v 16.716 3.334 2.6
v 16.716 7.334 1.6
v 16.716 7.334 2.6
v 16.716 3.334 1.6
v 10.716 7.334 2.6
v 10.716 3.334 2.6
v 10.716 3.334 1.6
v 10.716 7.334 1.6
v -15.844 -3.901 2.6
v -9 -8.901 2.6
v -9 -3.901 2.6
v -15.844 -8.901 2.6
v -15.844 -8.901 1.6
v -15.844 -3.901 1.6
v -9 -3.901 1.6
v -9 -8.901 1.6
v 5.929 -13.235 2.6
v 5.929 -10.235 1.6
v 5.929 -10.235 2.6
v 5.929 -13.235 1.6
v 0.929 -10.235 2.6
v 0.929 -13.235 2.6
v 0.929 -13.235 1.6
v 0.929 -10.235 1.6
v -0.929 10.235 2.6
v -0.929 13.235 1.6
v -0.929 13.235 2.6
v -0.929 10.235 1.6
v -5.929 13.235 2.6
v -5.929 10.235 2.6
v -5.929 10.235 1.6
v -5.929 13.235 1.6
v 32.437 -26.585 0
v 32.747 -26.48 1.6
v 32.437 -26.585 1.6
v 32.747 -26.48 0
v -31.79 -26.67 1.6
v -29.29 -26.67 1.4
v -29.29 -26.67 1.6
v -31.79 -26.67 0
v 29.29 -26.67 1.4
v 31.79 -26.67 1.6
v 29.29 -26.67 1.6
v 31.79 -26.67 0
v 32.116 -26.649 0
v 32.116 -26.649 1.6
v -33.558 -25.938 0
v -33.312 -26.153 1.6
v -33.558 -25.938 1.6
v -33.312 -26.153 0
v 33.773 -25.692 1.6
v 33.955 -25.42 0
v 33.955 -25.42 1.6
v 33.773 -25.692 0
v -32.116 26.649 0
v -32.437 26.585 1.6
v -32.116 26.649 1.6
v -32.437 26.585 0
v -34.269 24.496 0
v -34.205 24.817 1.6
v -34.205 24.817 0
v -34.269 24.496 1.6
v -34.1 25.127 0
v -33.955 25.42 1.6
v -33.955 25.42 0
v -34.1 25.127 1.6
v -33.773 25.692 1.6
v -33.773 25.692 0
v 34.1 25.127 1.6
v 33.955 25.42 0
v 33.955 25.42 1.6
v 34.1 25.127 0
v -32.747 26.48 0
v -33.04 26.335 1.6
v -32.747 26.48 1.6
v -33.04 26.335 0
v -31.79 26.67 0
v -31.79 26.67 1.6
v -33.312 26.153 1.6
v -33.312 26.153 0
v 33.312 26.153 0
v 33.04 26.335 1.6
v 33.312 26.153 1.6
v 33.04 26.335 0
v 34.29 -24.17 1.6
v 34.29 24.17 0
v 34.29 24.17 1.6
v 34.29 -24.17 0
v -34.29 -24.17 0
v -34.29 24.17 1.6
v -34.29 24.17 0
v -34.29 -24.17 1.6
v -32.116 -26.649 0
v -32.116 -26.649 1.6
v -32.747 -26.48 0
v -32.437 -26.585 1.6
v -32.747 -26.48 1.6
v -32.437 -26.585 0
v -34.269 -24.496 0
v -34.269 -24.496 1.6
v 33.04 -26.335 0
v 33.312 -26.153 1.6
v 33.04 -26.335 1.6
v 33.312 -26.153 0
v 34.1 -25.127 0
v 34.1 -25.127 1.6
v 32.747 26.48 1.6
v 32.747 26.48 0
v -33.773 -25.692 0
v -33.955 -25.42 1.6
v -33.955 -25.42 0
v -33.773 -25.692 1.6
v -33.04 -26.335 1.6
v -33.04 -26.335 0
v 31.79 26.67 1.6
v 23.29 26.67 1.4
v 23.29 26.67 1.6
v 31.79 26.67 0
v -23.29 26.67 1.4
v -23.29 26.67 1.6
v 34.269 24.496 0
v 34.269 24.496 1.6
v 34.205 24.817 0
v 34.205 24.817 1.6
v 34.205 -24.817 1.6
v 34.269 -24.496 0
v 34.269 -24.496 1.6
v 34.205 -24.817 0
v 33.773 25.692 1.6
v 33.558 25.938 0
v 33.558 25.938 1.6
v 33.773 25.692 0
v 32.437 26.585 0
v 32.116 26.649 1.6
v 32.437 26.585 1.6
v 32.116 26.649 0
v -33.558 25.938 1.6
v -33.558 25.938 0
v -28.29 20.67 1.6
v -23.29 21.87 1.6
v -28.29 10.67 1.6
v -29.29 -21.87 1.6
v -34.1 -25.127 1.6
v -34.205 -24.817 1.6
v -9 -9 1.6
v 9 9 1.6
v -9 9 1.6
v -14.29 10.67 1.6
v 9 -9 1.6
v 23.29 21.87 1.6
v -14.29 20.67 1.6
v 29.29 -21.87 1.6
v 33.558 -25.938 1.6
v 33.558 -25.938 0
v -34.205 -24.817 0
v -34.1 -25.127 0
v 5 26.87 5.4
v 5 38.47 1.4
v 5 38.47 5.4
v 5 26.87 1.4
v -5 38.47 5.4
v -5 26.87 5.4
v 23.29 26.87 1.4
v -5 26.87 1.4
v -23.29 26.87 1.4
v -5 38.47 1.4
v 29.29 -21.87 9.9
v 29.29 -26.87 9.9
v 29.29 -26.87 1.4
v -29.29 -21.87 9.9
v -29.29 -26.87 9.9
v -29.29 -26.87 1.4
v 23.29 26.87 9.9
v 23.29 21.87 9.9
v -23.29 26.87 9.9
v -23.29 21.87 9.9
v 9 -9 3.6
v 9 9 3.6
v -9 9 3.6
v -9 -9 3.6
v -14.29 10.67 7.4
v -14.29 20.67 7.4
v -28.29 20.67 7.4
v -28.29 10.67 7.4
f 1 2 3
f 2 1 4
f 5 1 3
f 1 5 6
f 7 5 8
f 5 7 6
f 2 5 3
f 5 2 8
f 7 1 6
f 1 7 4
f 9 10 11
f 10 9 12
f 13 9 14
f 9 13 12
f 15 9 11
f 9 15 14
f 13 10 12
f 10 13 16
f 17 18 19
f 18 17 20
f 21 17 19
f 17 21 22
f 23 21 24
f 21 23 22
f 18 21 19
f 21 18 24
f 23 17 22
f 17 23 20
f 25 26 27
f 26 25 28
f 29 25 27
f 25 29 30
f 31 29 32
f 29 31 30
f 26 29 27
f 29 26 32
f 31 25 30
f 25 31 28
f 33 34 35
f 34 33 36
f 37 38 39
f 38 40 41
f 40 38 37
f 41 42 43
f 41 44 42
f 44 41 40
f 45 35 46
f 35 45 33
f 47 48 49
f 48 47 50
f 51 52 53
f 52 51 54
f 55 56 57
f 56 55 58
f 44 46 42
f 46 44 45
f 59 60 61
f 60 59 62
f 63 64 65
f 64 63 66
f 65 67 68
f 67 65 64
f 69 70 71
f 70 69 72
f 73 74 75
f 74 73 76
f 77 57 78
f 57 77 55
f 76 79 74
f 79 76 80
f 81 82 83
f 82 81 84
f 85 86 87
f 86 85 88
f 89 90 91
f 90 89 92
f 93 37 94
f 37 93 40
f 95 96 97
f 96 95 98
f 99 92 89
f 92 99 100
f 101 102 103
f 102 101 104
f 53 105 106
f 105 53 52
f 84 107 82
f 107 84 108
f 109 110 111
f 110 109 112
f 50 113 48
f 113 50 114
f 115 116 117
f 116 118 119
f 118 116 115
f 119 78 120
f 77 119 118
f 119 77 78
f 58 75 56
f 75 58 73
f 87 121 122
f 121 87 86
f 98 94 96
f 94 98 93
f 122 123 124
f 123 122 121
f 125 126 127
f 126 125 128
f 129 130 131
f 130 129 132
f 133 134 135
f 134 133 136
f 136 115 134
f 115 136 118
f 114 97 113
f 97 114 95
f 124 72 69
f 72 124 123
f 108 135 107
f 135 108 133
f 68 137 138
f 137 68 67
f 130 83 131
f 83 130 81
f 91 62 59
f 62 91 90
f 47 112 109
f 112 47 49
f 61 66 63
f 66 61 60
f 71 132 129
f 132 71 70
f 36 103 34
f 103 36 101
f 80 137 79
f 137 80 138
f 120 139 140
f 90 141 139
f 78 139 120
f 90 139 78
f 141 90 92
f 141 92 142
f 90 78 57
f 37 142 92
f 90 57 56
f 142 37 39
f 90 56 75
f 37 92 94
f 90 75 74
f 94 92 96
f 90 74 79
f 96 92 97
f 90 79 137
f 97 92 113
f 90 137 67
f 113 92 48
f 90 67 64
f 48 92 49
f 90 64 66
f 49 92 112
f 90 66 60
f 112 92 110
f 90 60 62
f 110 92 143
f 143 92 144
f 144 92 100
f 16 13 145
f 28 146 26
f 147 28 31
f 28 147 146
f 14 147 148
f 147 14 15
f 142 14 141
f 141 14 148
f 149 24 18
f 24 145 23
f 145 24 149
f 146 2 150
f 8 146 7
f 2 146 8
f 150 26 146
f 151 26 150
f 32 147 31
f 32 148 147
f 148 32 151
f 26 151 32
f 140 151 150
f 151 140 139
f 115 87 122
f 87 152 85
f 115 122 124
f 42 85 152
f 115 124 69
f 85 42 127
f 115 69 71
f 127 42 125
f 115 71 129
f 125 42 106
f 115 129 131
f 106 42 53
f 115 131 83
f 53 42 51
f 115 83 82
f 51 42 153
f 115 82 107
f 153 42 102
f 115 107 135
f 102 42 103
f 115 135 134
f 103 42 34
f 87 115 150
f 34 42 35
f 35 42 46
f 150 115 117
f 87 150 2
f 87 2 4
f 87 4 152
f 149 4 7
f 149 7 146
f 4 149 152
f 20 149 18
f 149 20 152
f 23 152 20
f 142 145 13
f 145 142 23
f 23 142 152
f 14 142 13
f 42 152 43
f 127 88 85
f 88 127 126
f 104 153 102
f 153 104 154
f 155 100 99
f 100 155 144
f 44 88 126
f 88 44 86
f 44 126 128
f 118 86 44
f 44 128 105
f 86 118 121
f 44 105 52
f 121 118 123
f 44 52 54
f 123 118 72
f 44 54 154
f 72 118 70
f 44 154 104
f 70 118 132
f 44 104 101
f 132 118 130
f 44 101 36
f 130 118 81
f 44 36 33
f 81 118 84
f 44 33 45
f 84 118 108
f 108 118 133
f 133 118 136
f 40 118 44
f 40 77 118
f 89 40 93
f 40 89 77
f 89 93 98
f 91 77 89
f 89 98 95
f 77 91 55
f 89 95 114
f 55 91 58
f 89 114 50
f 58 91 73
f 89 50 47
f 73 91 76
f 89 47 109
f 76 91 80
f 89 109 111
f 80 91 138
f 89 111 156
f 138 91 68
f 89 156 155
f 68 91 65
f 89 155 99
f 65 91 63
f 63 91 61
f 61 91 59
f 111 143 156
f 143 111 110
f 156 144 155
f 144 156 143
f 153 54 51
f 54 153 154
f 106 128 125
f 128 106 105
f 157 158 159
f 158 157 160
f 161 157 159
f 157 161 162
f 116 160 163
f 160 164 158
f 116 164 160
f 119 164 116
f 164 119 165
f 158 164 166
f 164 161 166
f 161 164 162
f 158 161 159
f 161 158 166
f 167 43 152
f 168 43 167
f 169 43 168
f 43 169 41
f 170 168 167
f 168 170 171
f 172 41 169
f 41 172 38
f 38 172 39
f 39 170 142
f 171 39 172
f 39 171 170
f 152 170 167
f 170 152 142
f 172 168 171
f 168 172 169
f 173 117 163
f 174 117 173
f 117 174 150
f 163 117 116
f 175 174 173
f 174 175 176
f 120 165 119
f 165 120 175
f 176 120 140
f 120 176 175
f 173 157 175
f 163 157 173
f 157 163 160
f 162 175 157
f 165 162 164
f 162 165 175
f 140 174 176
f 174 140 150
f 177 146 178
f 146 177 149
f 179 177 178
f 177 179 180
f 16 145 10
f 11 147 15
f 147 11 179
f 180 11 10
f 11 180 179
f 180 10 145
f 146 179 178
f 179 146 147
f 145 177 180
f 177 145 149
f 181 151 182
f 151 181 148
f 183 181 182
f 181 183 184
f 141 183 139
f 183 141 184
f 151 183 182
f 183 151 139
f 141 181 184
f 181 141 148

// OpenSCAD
// Microcontroller development board (connected solid)
// Target PCB: 68.58mm x 53.34mm x 1.6mm

$fn = 48;

// Parameters
length = 68.58;
width  = 53.34;
thickness = 1.6;

// Small overlap to guarantee watertight unions
ov = 0.2;

// Helper: rounded rectangle prism (centered)
module rounded_rect_prism(l, w, h, r) {
    linear_extrude(height=h, center=true)
        offset(r=r)
            square([l-2*r, w-2*r], center=true);
}

module dev_board() {
    // PCB outline (rounded corners)
    pcb_r = 2.5;

    // Major features (kept simple but recognizable)
    usb_l = 12.0;
    usb_w = 10.0;
    usb_h = 4.0;

    header_h = 8.5;
    header_w = 5.0;
    header_l_long = length - 10.0;
    header_l_short = length - 22.0;

    mcu_l = 18.0;
    mcu_w = 18.0;
    mcu_h = 2.2;

    // Place everything so the bottom of PCB is at z=0 (easier to reason about)
    union() {
        // PCB
        translate([0, 0, thickness/2])
            rounded_rect_prism(length, width, thickness, pcb_r);

        // USB connector on one short edge (protrudes outward, but overlaps into PCB)
        // Positioned at +Y edge, centered in X
        translate([0,
                   width/2 + usb_l/2 - ov,
                   thickness + usb_h/2 - ov])
            cube([usb_w, usb_l, usb_h], center=true);

        // Two long header blocks along the long edges (top side), overlapping into PCB
        // Left edge header
        translate([0,
                   -width/2 + header_w/2 - ov,
                   thickness + header_h/2 - ov])
            cube([header_l_long, header_w, header_h], center=true);

        // Right edge header
        translate([0,
                   width/2 - header_w/2 + ov,
                   thickness + header_h/2 - ov])
            cube([header_l_short, header_w, header_h], center=true);

        // Main MCU package near center (top side)
        translate([0,
                   0,
                   thickness + mcu_h/2 - ov])
            cube([mcu_l, mcu_w, mcu_h], center=true);

        // Small power jack-like block near USB (top side), connected
        jack_l = 14.0;
        jack_w = 10.0;
        jack_h = 6.0;
        translate([-(length/2 - jack_l/2 - 6.0),
                   width/2 - jack_w/2 - 6.0,
                   thickness + jack_h/2 - ov])
            cube([jack_l, jack_w, jack_h], center=true);

        // A few low-profile components (top side) to avoid "blank slab" look
        comp_h = 1.2;
        for (p = [
            [ length*0.20,  width*0.10, 6, 4],
            [-length*0.18, -width*0.12, 7, 5],
            [ length*0.05, -width*0.22, 5, 3],
            [-length*0.05,  width*0.22, 5, 3]
        ]) {
            translate([p[0], p[1], thickness + comp_h/2 - ov])
                cube([p[2], p[3], comp_h], center=true);
        }
    }
}

dev_board();
